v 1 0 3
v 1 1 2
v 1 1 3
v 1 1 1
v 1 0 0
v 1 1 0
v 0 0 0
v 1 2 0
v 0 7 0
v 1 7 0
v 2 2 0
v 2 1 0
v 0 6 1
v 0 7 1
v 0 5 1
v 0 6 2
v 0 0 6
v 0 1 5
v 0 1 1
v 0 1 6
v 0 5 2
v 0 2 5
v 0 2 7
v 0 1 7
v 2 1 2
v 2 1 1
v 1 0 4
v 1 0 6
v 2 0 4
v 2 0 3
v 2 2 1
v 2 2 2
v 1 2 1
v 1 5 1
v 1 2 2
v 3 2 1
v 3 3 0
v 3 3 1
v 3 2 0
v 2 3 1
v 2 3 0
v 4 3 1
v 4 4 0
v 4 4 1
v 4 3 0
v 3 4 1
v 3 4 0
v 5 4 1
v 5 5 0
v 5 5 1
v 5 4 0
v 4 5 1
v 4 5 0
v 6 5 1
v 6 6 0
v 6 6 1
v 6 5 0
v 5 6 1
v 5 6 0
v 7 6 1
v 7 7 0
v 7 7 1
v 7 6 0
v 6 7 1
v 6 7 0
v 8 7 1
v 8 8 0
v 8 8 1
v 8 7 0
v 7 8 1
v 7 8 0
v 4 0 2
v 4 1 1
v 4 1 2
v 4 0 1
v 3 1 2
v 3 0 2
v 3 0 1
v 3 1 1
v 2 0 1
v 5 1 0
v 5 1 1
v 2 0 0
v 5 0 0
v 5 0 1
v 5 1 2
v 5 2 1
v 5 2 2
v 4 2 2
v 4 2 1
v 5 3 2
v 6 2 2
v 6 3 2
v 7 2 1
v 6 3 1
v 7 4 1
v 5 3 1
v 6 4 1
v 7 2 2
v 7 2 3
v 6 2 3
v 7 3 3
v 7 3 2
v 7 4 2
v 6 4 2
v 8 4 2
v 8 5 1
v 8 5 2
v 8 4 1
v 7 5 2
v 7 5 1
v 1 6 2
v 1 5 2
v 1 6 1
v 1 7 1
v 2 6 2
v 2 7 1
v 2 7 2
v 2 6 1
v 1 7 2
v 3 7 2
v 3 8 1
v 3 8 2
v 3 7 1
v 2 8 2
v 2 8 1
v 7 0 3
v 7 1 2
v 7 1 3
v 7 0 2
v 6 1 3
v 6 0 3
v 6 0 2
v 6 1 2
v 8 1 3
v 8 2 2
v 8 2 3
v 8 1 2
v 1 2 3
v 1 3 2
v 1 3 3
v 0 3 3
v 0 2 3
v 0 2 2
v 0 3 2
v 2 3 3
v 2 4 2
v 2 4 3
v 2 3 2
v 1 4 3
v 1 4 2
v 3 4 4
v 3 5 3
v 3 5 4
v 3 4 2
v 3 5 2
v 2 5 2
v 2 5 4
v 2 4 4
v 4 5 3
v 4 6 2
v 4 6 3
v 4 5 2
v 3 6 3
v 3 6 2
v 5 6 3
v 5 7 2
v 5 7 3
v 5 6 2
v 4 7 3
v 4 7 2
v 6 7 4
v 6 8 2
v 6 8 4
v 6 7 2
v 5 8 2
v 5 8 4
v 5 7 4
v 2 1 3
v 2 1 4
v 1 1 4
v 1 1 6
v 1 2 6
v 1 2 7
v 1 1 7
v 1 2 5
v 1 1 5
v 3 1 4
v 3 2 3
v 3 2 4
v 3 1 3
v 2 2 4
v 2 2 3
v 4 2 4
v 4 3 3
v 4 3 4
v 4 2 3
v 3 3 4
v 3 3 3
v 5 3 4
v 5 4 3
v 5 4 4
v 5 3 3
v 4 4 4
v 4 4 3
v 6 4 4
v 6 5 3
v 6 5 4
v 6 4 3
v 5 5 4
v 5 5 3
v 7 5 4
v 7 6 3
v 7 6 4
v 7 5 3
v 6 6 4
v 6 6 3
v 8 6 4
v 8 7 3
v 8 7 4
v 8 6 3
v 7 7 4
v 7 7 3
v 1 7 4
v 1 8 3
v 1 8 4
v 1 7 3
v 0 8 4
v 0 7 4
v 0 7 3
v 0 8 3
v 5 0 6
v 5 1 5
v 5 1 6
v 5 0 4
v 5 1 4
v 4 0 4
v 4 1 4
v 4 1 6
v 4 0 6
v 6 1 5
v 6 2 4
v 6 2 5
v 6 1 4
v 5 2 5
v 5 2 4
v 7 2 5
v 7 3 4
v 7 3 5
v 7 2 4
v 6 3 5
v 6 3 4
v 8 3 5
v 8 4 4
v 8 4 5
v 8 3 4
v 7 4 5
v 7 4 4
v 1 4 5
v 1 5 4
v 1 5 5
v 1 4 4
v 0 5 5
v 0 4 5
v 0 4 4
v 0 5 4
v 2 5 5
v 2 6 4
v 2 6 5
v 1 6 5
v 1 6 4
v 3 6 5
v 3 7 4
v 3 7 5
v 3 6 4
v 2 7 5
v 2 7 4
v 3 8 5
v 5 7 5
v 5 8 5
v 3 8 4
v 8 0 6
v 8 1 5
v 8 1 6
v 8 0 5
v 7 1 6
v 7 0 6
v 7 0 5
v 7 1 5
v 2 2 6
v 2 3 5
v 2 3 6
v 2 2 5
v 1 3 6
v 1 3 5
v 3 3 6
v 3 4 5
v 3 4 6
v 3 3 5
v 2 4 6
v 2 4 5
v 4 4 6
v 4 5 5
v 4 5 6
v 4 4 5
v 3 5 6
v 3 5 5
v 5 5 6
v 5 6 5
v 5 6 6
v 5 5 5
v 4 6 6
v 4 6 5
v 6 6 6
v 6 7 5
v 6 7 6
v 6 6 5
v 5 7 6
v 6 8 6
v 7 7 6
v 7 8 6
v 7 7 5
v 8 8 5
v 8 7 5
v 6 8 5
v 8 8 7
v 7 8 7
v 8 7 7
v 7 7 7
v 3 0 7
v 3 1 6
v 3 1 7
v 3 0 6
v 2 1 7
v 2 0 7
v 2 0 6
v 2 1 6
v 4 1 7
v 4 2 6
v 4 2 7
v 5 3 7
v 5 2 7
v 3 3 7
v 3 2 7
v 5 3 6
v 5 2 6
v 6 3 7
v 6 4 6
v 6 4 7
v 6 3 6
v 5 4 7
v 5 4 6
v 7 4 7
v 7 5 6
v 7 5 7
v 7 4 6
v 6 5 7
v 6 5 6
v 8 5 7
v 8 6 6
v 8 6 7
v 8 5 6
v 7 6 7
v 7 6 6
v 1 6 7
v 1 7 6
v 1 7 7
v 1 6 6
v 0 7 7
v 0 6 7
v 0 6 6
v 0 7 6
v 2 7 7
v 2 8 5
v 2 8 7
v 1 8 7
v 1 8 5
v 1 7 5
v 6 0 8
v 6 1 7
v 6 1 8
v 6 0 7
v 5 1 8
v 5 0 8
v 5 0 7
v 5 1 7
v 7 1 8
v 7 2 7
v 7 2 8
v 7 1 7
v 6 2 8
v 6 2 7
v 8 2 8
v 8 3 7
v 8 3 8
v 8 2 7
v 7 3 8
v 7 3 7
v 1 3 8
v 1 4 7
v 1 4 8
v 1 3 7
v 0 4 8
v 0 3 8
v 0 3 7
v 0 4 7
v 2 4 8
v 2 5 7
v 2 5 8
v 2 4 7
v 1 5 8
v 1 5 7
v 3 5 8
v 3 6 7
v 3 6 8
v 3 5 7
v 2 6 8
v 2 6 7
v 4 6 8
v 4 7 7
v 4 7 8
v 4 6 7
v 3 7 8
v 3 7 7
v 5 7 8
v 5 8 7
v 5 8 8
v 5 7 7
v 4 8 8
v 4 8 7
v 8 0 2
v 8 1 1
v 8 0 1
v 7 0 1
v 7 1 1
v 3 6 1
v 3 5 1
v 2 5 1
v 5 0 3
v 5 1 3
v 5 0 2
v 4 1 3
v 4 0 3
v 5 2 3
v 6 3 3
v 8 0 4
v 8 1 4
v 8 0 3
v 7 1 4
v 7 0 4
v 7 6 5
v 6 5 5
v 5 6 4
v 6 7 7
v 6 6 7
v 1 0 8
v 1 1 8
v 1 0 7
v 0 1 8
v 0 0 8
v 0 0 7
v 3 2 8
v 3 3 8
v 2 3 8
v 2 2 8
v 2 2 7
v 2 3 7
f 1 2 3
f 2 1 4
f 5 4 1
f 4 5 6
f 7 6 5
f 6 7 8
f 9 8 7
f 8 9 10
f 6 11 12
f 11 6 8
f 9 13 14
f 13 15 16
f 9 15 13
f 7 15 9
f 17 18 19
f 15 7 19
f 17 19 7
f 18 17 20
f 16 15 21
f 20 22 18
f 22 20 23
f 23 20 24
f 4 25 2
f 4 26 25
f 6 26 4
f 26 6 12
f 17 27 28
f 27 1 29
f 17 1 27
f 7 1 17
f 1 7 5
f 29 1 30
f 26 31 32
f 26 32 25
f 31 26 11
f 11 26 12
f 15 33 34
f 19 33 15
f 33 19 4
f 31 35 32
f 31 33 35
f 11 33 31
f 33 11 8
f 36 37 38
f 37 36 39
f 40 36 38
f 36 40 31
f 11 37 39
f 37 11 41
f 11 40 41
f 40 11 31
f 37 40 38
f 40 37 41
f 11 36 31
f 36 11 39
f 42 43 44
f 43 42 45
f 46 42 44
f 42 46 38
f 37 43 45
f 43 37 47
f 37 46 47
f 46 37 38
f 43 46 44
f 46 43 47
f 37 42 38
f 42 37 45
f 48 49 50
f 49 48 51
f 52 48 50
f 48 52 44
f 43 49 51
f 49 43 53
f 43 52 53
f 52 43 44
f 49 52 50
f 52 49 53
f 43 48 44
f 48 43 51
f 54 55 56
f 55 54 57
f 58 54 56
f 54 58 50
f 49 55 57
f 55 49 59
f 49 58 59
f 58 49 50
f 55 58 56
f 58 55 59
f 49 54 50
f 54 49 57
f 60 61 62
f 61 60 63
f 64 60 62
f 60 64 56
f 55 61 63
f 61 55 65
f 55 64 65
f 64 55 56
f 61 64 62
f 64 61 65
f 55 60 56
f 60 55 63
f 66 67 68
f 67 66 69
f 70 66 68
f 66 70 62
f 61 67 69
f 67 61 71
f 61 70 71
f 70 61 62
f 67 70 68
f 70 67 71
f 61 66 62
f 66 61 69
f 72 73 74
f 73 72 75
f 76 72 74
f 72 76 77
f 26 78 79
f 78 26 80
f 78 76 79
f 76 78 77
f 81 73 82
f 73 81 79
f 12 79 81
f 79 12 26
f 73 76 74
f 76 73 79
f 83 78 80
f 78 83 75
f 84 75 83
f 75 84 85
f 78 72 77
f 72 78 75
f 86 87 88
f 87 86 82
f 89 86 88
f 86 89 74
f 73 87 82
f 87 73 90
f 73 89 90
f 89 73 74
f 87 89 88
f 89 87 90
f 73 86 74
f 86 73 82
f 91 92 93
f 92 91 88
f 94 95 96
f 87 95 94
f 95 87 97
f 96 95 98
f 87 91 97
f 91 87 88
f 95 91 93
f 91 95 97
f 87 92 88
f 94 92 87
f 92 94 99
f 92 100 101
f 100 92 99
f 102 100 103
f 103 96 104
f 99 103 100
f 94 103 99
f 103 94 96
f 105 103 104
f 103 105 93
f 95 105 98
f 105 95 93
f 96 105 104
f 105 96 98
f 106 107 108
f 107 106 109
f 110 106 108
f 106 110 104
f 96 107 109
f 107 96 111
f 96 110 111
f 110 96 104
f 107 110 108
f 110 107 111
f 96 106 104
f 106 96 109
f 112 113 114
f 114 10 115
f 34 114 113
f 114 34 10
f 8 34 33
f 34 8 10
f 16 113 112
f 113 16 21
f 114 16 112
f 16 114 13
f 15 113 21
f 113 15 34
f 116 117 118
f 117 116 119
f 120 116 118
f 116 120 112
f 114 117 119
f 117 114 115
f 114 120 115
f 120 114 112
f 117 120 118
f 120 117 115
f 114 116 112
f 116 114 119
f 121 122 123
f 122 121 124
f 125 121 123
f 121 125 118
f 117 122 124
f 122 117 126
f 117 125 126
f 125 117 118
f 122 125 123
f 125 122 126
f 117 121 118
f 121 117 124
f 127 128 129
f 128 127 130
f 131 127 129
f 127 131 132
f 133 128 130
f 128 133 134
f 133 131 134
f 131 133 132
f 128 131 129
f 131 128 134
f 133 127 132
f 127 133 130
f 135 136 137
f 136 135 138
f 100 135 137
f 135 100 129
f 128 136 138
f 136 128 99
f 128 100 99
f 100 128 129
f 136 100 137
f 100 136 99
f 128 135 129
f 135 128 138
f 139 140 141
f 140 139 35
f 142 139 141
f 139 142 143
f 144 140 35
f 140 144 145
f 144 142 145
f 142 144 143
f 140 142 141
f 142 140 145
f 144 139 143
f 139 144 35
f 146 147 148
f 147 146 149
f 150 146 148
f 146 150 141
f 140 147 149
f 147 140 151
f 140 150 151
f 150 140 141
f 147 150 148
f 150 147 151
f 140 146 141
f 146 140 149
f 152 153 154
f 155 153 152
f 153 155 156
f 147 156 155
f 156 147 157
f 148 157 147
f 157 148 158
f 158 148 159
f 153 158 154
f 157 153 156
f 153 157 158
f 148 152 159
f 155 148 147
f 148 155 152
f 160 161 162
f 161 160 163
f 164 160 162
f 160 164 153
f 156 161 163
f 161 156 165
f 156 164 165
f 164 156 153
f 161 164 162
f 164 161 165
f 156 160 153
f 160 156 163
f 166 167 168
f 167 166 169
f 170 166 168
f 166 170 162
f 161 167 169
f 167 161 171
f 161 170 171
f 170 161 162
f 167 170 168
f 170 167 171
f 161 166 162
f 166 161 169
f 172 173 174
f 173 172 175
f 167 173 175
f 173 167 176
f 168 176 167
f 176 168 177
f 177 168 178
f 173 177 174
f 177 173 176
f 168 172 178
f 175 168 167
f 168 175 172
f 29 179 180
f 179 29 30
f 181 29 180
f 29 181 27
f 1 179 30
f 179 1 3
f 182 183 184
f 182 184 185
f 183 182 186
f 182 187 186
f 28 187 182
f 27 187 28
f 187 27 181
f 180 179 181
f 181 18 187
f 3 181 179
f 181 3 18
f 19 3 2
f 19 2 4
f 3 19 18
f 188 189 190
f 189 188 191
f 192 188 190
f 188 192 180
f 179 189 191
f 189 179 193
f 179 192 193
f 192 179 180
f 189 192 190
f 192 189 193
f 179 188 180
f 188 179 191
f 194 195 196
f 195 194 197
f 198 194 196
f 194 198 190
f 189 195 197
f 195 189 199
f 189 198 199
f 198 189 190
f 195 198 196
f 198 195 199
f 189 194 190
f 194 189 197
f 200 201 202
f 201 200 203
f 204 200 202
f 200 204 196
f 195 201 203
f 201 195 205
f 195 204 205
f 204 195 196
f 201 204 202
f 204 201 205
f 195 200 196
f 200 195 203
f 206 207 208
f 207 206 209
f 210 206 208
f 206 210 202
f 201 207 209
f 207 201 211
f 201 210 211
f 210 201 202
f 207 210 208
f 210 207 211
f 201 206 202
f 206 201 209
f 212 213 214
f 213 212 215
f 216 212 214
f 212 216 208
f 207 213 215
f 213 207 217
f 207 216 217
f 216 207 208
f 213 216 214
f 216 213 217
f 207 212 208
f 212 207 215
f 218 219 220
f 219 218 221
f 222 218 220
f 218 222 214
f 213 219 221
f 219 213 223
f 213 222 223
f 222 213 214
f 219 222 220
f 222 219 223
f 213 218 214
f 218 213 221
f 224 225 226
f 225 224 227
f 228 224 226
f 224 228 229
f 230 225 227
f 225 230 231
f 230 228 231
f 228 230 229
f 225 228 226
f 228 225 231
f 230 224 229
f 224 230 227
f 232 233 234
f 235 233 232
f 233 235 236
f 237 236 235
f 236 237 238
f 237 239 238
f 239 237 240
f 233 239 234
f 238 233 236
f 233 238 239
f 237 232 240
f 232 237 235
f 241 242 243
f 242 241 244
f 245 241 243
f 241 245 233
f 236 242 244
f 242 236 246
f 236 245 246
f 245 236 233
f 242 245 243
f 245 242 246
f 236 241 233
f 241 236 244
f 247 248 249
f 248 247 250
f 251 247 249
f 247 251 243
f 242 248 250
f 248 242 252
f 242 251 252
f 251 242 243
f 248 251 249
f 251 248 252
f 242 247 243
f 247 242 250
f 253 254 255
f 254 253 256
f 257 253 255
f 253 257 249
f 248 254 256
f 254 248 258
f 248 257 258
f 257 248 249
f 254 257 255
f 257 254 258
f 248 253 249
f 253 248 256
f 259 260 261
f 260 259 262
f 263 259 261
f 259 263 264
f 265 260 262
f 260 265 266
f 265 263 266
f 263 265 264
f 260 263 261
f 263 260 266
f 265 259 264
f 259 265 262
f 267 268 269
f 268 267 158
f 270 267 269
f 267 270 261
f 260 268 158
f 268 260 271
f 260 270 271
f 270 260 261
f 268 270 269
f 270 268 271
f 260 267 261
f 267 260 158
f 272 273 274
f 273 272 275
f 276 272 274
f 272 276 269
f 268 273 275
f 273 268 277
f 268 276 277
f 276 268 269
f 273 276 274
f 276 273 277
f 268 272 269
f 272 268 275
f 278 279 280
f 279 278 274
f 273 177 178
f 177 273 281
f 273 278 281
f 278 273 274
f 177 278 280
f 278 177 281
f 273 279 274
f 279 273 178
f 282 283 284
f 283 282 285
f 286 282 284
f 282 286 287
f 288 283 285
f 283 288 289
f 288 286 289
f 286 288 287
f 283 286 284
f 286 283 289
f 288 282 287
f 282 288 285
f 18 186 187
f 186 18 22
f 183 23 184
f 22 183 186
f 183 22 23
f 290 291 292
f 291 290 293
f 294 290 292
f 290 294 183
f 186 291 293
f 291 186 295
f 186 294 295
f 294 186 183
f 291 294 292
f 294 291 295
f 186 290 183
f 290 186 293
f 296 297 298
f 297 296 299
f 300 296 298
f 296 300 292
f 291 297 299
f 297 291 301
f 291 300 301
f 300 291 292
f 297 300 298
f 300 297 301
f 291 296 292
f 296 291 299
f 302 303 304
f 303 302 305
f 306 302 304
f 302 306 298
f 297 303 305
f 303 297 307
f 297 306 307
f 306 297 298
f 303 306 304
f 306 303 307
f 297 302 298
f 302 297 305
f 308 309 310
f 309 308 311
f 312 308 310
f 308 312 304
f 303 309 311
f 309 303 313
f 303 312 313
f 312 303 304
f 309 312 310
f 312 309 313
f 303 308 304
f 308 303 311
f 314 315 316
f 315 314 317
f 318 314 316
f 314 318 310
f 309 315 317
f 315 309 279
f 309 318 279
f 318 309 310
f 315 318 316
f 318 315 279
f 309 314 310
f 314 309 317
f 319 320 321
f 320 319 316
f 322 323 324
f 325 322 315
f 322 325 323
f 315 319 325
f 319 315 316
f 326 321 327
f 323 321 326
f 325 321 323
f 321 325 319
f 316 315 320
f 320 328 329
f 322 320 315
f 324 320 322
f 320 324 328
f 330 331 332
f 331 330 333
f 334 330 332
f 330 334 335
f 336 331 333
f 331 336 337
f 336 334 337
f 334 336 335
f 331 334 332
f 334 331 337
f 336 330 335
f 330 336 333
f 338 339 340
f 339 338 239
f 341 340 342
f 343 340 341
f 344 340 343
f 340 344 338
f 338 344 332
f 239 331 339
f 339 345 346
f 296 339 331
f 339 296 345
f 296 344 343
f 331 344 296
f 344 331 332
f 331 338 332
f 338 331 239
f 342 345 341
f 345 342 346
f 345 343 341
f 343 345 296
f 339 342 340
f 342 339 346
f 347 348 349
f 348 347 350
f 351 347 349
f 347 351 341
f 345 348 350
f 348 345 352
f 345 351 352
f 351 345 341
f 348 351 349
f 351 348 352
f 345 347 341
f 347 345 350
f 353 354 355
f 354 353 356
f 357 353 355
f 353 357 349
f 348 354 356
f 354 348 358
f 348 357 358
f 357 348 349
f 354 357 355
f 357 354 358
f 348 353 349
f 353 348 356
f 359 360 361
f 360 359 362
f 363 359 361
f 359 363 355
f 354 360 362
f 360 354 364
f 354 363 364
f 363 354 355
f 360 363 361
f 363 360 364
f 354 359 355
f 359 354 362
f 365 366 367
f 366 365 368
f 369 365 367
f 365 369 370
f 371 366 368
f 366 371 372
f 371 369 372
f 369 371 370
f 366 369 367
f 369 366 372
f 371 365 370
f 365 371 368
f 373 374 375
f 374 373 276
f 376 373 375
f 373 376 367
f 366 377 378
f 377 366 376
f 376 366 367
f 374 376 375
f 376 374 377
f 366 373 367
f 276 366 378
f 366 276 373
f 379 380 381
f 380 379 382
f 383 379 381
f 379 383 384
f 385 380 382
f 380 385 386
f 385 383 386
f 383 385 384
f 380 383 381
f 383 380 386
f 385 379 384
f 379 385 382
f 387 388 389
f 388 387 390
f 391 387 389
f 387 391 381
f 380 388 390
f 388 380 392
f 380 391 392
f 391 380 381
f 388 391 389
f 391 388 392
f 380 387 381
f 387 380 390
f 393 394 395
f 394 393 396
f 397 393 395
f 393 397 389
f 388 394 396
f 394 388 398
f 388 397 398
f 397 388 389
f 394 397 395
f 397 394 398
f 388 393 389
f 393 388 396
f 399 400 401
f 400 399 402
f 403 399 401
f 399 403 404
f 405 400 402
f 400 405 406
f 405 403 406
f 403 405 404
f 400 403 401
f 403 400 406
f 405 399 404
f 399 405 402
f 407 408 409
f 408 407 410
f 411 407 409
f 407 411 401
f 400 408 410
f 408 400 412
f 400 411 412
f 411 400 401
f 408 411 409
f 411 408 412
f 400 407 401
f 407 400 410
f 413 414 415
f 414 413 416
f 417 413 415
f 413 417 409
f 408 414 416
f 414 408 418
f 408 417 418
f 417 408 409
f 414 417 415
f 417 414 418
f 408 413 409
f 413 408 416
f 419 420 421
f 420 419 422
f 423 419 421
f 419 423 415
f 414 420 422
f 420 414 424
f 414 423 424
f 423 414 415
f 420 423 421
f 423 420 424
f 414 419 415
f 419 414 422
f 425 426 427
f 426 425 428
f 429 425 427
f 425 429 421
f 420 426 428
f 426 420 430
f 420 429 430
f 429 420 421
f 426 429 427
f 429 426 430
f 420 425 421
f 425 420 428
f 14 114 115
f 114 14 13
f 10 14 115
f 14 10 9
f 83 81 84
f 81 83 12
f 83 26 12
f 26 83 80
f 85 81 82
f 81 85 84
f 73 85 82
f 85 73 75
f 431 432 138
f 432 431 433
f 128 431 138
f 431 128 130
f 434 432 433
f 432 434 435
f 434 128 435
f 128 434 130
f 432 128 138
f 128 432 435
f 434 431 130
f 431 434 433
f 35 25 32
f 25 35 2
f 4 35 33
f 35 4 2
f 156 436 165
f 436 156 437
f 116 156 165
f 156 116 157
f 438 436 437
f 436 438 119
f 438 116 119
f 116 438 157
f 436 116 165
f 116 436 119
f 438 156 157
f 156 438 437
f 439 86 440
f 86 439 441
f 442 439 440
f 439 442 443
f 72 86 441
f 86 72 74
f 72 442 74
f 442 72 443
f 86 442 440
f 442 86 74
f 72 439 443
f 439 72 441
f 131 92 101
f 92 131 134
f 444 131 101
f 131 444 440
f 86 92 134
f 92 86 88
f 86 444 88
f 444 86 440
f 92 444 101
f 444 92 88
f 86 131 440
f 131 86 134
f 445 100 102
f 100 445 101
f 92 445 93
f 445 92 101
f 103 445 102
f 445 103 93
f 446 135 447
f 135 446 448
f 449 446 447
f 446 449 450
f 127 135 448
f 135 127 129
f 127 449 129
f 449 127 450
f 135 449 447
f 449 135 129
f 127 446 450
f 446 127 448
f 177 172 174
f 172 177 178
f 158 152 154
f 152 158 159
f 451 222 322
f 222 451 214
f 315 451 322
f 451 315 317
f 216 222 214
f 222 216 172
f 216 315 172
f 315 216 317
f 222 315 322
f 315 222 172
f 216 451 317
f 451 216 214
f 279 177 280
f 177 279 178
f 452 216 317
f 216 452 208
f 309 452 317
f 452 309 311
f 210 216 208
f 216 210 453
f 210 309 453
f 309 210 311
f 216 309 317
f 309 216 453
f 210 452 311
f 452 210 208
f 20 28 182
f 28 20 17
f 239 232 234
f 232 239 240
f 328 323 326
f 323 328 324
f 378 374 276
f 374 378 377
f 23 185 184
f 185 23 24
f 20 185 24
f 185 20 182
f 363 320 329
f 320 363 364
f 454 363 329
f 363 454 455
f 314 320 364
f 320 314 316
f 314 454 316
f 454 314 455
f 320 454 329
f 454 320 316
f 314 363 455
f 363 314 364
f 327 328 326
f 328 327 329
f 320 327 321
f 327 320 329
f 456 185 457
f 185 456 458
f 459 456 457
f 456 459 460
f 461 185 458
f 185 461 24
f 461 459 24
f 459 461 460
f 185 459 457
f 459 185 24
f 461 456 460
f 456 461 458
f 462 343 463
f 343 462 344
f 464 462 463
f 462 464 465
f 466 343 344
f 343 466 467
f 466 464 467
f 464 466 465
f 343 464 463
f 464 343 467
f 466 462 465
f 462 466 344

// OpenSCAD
union() {
    translate([0, 0, 0]) cube([1, 1, 1]);
    translate([1, 1, 0]) cube([1, 1, 1]);
    translate([2, 2, 0]) cube([1, 1, 1]);
    translate([3, 3, 0]) cube([1, 1, 1]);
    translate([4, 4, 0]) cube([1, 1, 1]);
    translate([5, 5, 0]) cube([1, 1, 1]);
    translate([6, 6, 0]) cube([1, 1, 1]);
    translate([7, 7, 0]) cube([1, 1, 1]);
    translate([3, 0, 1]) cube([1, 1, 1]);
    translate([4, 1, 1]) cube([1, 1, 1]);
    translate([5, 2, 1]) cube([1, 1, 1]);
    translate([6, 3, 1]) cube([1, 1, 1]);
    translate([7, 4, 1]) cube([1, 1, 1]);
    translate([0, 5, 1]) cube([1, 1, 1]);
    translate([1, 6, 1]) cube([1, 1, 1]);
    translate([2, 7, 1]) cube([1, 1, 1]);
    translate([6, 0, 2]) cube([1, 1, 1]);
    translate([7, 1, 2]) cube([1, 1, 1]);
    translate([0, 2, 2]) cube([1, 1, 1]);
    translate([1, 3, 2]) cube([1, 1, 1]);
    translate([2, 4, 2]) cube([1, 1, 1]);
    translate([3, 5, 2]) cube([1, 1, 1]);
    translate([4, 6, 2]) cube([1, 1, 1]);
    translate([5, 7, 2]) cube([1, 1, 1]);
    translate([1, 0, 3]) cube([1, 1, 1]);
    translate([2, 1, 3]) cube([1, 1, 1]);
    translate([3, 2, 3]) cube([1, 1, 1]);
    translate([4, 3, 3]) cube([1, 1, 1]);
    translate([5, 4, 3]) cube([1, 1, 1]);
    translate([6, 5, 3]) cube([1, 1, 1]);
    translate([7, 6, 3]) cube([1, 1, 1]);
    translate([0, 7, 3]) cube([1, 1, 1]);
    translate([4, 0, 4]) cube([1, 1, 1]);
    translate([5, 1, 4]) cube([1, 1, 1]);
    translate([6, 2, 4]) cube([1, 1, 1]);
    translate([7, 3, 4]) cube([1, 1, 1]);
    translate([0, 4, 4]) cube([1, 1, 1]);
    translate([1, 5, 4]) cube([1, 1, 1]);
    translate([2, 6, 4]) cube([1, 1, 1]);
    translate([3, 7, 4]) cube([1, 1, 1]);
    translate([7, 0, 5]) cube([1, 1, 1]);
    translate([0, 1, 5]) cube([1, 1, 1]);
    translate([1, 2, 5]) cube([1, 1, 1]);
    translate([2, 3, 5]) cube([1, 1, 1]);
    translate([3, 4, 5]) cube([1, 1, 1]);
    translate([4, 5, 5]) cube([1, 1, 1]);
    translate([5, 6, 5]) cube([1, 1, 1]);
    translate([6, 7, 5]) cube([1, 1, 1]);
    translate([2, 0, 6]) cube([1, 1, 1]);
    translate([3, 1, 6]) cube([1, 1, 1]);
    translate([4, 2, 6]) cube([1, 1, 1]);
    translate([5, 3, 6]) cube([1, 1, 1]);
    translate([6, 4, 6]) cube([1, 1, 1]);
    translate([7, 5, 6]) cube([1, 1, 1]);
    translate([0, 6, 6]) cube([1, 1, 1]);
    translate([1, 7, 6]) cube([1, 1, 1]);
    translate([5, 0, 7]) cube([1, 1, 1]);
    translate([6, 1, 7]) cube([1, 1, 1]);
    translate([7, 2, 7]) cube([1, 1, 1]);
    translate([0, 3, 7]) cube([1, 1, 1]);
    translate([1, 4, 7]) cube([1, 1, 1]);
    translate([2, 5, 7]) cube([1, 1, 1]);
    translate([3, 6, 7]) cube([1, 1, 1]);
    translate([4, 7, 7]) cube([1, 1, 1]);
    translate([0, 1, 0]) cube([1, 1, 1]);
    translate([0, 2, 0]) cube([1, 1, 1]);
    translate([0, 3, 0]) cube([1, 1, 1]);
    translate([0, 4, 0]) cube([1, 1, 1]);
    translate([0, 5, 0]) cube([1, 1, 1]);
    translate([0, 6, 0]) cube([1, 1, 1]);
    translate([2, 0, 0]) cube([1, 1, 1]);
    translate([3, 0, 0]) cube([1, 1, 1]);
    translate([4, 0, 0]) cube([1, 1, 1]);
    translate([0, 0, 1]) cube([1, 1, 1]);
    translate([7, 0, 1]) cube([1, 1, 1]);
    translate([1, 1, 1]) cube([1, 1, 1]);
    translate([6, 2, 1]) cube([1, 1, 1]);
    translate([2, 5, 1]) cube([1, 1, 1]);
    translate([0, 0, 2]) cube([1, 1, 1]);
    translate([4, 0, 2]) cube([1, 1, 1]);
    translate([5, 1, 2]) cube([1, 1, 1]);
    translate([6, 2, 2]) cube([1, 1, 1]);
    translate([0, 0, 3]) cube([1, 1, 1]);
    translate([7, 0, 3]) cube([1, 1, 1]);
    translate([5, 7, 3]) cube([1, 1, 1]);
    translate([2, 4, 3]) cube([1, 1, 1]);
    translate([0, 0, 4]) cube([1, 1, 1]);
    translate([6, 6, 4]) cube([1, 1, 1]);
    translate([4, 7, 4]) cube([1, 1, 1]);
    translate([5, 5, 4]) cube([1, 1, 1]);
    translate([0, 0, 5]) cube([1, 1, 1]);
    translate([4, 0, 5]) cube([1, 1, 1]);
    translate([7, 7, 5]) cube([1, 1, 1]);
    translate([1, 7, 5]) cube([1, 1, 1]);
    translate([0, 1, 6]) cube([1, 1, 1]);
    translate([3, 2, 6]) cube([1, 1, 1]);
    translate([6, 6, 6]) cube([1, 1, 1]);
    translate([7, 7, 6]) cube([1, 1, 1]);
    translate([0, 0, 7]) cube([1, 1, 1]);
    translate([2, 2, 7]) cube([1, 1, 1]);
}
